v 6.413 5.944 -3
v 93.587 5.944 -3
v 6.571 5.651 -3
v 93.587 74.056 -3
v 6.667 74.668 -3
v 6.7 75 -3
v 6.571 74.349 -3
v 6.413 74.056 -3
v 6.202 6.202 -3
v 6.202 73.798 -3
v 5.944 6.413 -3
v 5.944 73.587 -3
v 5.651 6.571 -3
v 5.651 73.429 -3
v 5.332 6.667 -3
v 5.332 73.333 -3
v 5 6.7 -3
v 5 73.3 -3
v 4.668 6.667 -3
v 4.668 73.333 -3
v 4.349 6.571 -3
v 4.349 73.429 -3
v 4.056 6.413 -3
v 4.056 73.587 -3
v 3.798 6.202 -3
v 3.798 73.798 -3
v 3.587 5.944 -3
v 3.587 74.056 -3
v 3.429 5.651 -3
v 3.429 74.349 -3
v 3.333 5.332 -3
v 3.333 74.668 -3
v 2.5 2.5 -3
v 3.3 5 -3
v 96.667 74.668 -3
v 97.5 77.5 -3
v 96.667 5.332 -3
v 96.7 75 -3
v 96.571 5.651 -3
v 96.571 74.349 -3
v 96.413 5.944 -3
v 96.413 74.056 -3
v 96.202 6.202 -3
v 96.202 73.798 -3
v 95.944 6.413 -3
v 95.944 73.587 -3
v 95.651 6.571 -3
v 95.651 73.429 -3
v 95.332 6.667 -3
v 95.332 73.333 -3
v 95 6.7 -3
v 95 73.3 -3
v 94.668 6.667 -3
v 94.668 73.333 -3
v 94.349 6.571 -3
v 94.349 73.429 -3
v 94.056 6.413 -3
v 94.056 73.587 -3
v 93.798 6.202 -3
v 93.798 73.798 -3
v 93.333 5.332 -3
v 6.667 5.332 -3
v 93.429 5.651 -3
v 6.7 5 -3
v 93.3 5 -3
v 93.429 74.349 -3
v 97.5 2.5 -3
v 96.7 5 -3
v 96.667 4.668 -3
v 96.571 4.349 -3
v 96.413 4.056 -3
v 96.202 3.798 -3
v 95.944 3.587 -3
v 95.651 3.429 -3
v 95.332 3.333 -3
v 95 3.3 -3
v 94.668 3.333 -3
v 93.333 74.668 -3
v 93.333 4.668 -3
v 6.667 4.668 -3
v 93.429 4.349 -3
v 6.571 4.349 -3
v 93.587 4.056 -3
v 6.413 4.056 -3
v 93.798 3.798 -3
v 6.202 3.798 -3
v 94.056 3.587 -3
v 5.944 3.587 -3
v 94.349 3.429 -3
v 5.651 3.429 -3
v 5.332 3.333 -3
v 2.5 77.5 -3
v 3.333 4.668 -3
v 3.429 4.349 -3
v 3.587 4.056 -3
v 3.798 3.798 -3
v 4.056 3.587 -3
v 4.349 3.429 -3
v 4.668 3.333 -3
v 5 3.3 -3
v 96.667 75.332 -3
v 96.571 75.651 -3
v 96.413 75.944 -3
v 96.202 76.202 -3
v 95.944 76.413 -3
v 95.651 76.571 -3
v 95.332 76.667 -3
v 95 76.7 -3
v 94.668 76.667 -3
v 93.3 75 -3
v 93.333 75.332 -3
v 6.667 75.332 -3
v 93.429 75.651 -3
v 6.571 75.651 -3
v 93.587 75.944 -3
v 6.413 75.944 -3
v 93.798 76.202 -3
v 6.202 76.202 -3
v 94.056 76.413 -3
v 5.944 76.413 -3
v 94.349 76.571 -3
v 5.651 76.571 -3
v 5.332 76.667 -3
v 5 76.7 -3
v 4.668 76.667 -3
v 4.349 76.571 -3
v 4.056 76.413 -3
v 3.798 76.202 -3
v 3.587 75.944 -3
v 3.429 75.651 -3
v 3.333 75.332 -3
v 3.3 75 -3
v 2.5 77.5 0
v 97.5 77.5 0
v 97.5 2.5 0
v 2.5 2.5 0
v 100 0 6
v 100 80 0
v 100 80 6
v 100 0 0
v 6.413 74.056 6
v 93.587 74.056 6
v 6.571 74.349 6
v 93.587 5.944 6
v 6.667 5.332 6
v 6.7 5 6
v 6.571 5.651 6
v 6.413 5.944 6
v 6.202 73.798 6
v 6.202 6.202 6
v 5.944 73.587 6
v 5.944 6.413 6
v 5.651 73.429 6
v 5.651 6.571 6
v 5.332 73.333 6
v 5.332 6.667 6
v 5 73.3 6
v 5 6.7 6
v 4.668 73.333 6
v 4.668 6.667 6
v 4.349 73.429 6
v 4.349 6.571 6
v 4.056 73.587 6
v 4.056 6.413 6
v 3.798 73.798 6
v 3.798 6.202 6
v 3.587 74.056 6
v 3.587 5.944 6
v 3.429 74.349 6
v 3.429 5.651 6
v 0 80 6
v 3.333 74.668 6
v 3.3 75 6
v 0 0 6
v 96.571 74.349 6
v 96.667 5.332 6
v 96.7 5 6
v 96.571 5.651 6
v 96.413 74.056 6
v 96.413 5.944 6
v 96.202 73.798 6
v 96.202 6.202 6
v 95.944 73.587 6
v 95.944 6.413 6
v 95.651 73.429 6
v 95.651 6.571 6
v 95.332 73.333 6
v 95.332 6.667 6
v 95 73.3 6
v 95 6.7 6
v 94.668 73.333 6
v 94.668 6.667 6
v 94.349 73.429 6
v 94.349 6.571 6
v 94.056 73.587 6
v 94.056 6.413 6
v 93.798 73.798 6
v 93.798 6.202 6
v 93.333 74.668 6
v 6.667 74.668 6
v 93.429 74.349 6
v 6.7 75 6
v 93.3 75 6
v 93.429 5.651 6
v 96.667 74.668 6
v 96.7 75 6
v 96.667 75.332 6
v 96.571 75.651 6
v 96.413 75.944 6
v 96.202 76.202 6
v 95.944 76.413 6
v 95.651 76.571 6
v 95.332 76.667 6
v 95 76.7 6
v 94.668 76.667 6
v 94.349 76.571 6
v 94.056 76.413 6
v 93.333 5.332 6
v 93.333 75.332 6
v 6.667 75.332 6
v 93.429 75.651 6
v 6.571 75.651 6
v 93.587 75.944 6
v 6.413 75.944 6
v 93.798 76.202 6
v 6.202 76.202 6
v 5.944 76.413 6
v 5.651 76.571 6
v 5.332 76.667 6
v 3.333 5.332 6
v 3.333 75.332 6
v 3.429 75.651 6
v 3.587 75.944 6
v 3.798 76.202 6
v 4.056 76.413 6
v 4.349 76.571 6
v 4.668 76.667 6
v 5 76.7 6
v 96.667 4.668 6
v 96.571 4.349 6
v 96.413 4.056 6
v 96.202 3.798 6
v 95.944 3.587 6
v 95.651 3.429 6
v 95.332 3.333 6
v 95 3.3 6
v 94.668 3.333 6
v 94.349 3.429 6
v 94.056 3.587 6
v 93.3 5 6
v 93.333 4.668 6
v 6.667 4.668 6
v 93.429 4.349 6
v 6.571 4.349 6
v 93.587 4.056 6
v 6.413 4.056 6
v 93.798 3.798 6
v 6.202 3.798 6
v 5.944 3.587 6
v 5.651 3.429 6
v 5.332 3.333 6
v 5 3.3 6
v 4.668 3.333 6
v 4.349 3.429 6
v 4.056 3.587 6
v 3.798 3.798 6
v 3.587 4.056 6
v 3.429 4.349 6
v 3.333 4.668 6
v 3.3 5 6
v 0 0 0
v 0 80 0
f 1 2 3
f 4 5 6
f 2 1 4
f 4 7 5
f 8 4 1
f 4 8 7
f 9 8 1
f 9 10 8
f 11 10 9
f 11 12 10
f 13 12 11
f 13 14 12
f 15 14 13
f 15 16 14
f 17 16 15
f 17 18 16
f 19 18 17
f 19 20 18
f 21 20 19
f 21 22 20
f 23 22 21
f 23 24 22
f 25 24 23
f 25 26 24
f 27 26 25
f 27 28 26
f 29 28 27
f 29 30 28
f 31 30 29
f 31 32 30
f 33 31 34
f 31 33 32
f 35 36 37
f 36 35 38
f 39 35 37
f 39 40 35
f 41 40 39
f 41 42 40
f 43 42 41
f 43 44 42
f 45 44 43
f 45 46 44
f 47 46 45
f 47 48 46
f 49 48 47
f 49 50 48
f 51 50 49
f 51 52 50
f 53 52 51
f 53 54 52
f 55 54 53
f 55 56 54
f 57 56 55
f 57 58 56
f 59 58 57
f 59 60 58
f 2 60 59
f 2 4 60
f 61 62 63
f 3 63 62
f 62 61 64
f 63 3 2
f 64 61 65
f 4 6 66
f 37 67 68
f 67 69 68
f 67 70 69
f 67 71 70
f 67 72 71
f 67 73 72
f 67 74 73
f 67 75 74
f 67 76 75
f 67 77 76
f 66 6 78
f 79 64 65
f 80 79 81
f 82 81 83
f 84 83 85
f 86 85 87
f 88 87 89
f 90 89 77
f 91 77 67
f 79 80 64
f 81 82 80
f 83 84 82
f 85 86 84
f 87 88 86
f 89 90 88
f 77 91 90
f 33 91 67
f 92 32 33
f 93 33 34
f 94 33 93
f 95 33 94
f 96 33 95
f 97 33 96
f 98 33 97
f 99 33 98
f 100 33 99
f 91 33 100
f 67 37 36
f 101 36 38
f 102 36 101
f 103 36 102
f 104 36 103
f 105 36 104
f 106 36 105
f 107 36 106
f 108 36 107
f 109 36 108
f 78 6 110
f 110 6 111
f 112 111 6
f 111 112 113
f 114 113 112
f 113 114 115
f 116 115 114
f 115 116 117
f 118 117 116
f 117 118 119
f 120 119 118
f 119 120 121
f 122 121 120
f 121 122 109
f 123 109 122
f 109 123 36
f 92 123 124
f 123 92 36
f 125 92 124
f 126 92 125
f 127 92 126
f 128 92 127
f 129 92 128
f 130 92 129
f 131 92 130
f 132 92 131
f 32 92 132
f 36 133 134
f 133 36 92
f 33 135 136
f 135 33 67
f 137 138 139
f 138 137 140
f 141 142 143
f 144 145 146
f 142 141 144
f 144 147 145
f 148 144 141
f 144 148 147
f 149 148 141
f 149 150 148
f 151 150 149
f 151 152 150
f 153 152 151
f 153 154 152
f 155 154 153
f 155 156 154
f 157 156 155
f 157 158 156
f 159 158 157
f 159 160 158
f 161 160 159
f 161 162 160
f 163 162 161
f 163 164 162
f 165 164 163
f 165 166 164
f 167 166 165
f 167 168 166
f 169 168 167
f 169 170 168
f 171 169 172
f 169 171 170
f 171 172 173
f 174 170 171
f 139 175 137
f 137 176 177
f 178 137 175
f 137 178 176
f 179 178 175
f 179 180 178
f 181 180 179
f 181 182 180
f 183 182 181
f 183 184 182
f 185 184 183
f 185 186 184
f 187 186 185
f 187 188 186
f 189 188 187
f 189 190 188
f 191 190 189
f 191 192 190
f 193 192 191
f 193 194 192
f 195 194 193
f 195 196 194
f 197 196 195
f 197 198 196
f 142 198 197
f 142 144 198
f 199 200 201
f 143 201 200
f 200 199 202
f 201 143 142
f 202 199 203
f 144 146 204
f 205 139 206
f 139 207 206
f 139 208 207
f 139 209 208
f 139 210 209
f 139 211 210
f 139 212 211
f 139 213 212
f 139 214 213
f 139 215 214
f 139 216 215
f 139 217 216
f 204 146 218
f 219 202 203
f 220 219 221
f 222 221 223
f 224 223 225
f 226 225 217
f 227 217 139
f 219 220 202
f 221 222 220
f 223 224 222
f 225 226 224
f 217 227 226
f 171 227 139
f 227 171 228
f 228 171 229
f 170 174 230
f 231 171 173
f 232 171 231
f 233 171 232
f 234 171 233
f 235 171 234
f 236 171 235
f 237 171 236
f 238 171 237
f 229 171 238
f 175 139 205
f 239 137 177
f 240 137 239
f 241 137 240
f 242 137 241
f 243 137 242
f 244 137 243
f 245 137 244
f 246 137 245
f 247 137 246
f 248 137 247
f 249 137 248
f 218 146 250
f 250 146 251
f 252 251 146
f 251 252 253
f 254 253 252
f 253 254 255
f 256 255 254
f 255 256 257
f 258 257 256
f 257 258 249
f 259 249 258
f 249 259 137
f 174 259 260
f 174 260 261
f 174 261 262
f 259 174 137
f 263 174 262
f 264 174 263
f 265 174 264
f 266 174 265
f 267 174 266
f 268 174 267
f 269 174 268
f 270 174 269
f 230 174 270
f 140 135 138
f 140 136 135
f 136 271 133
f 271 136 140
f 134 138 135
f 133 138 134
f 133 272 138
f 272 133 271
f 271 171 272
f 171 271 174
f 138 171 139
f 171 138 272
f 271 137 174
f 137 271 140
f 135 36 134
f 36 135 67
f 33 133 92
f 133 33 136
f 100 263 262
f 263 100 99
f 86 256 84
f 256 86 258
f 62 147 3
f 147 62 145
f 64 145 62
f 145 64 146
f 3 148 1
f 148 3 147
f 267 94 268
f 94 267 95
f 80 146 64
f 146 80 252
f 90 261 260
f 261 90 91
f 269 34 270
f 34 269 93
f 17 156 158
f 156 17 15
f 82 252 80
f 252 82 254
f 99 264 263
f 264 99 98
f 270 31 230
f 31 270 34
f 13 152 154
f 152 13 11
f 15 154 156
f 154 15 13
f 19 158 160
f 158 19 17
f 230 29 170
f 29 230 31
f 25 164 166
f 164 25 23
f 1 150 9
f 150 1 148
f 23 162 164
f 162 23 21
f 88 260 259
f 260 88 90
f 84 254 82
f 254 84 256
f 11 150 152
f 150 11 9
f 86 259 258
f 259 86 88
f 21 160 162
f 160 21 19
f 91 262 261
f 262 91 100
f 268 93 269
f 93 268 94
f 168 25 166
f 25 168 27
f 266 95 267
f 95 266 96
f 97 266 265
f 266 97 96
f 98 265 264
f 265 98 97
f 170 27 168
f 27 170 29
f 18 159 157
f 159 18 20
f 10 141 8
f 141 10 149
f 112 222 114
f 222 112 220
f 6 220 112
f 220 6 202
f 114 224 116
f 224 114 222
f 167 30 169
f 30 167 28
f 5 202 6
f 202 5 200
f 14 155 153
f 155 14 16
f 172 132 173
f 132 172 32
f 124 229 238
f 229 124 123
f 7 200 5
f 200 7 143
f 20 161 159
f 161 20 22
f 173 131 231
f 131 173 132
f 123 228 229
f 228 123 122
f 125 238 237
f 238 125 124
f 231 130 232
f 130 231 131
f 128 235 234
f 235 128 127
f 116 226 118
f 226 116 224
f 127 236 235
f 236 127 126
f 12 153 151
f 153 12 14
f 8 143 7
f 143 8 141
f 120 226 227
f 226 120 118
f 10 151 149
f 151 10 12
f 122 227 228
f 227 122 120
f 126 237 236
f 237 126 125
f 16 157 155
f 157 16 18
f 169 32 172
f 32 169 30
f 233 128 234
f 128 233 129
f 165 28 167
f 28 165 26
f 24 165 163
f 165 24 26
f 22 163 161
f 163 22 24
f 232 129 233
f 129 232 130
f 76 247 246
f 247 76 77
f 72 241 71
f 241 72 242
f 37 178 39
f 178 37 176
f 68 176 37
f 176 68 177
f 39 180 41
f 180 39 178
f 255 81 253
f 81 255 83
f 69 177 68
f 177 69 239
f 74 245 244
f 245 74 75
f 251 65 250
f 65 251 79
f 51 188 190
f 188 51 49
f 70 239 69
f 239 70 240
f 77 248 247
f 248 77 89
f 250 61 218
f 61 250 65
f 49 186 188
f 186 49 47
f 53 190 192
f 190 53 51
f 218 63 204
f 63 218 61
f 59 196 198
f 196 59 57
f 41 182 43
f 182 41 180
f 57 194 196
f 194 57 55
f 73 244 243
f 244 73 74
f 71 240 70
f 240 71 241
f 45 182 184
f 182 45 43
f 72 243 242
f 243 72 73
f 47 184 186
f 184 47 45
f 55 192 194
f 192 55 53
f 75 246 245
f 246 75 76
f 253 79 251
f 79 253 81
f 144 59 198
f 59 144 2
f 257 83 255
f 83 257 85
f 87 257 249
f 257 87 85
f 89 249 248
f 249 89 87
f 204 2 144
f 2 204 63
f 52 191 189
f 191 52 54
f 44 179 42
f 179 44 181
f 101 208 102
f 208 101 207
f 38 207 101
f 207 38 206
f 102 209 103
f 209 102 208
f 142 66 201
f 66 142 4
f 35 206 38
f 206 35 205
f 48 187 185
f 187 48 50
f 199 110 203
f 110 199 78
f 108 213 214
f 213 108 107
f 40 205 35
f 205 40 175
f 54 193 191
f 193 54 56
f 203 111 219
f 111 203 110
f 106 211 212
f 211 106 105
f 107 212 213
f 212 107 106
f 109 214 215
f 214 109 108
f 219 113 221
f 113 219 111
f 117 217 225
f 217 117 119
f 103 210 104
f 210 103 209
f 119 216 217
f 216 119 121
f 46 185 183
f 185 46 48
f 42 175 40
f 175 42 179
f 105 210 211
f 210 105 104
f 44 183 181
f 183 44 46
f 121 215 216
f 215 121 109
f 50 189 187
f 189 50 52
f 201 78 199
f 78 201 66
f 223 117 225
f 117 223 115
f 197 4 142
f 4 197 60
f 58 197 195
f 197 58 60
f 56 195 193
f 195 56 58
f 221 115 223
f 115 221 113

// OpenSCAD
$fn = 32;

// ----------------------------------------------------------------------
// Enclosure lid: 100 x 80 x 6 mm, 4 bolt holes
// ----------------------------------------------------------------------

// --- parameters (mm) ---
length = 100;             // lid length, X
width = 80;               // lid width, Y
plate_t = 6;              // lid plate thickness
bolt_d = 3.4;             // bolt clearance
boss_lip = 5;             // bolt hole inset from the corner
sink = 1;                 // overlap of the lip and ribs into the plate
lip_h = 4;                // lip height below the plate
lip_wall = 2.5;           // lip wall thickness
rib_n = 4;                // stiffening ribs
rib_t = 3;                // rib thickness
rib_h = 4;                // rib height below the plate

module plate() {
  cube([length, width, plate_t]);
  /* lip that drops into the housing opening, sunk into the plate */
  translate([lip_wall, lip_wall, -lip_h + sink]) cube([length - 2 * lip_wall, width - 2 * lip_wall, lip_h]);
  /* stiffening ribs under the plate */
  for (i = [1 : rib_n]) translate([length * i / (rib_n + 1) - rib_t / 2, lip_wall, -rib_h + sink]) cube([rib_t, width - 2 * lip_wall, rib_h]);
}

difference() {
  plate();
  /* bolt pattern matching the corner bosses */
  for (sx = [0, 1]) for (sy = [0, 1])
    translate([sx * (length - 2 * boss_lip) + boss_lip, sy * (width - 2 * boss_lip) + boss_lip, -lip_h - 1])
      cylinder(h = plate_t + lip_h + 2, d = bolt_d);
}
